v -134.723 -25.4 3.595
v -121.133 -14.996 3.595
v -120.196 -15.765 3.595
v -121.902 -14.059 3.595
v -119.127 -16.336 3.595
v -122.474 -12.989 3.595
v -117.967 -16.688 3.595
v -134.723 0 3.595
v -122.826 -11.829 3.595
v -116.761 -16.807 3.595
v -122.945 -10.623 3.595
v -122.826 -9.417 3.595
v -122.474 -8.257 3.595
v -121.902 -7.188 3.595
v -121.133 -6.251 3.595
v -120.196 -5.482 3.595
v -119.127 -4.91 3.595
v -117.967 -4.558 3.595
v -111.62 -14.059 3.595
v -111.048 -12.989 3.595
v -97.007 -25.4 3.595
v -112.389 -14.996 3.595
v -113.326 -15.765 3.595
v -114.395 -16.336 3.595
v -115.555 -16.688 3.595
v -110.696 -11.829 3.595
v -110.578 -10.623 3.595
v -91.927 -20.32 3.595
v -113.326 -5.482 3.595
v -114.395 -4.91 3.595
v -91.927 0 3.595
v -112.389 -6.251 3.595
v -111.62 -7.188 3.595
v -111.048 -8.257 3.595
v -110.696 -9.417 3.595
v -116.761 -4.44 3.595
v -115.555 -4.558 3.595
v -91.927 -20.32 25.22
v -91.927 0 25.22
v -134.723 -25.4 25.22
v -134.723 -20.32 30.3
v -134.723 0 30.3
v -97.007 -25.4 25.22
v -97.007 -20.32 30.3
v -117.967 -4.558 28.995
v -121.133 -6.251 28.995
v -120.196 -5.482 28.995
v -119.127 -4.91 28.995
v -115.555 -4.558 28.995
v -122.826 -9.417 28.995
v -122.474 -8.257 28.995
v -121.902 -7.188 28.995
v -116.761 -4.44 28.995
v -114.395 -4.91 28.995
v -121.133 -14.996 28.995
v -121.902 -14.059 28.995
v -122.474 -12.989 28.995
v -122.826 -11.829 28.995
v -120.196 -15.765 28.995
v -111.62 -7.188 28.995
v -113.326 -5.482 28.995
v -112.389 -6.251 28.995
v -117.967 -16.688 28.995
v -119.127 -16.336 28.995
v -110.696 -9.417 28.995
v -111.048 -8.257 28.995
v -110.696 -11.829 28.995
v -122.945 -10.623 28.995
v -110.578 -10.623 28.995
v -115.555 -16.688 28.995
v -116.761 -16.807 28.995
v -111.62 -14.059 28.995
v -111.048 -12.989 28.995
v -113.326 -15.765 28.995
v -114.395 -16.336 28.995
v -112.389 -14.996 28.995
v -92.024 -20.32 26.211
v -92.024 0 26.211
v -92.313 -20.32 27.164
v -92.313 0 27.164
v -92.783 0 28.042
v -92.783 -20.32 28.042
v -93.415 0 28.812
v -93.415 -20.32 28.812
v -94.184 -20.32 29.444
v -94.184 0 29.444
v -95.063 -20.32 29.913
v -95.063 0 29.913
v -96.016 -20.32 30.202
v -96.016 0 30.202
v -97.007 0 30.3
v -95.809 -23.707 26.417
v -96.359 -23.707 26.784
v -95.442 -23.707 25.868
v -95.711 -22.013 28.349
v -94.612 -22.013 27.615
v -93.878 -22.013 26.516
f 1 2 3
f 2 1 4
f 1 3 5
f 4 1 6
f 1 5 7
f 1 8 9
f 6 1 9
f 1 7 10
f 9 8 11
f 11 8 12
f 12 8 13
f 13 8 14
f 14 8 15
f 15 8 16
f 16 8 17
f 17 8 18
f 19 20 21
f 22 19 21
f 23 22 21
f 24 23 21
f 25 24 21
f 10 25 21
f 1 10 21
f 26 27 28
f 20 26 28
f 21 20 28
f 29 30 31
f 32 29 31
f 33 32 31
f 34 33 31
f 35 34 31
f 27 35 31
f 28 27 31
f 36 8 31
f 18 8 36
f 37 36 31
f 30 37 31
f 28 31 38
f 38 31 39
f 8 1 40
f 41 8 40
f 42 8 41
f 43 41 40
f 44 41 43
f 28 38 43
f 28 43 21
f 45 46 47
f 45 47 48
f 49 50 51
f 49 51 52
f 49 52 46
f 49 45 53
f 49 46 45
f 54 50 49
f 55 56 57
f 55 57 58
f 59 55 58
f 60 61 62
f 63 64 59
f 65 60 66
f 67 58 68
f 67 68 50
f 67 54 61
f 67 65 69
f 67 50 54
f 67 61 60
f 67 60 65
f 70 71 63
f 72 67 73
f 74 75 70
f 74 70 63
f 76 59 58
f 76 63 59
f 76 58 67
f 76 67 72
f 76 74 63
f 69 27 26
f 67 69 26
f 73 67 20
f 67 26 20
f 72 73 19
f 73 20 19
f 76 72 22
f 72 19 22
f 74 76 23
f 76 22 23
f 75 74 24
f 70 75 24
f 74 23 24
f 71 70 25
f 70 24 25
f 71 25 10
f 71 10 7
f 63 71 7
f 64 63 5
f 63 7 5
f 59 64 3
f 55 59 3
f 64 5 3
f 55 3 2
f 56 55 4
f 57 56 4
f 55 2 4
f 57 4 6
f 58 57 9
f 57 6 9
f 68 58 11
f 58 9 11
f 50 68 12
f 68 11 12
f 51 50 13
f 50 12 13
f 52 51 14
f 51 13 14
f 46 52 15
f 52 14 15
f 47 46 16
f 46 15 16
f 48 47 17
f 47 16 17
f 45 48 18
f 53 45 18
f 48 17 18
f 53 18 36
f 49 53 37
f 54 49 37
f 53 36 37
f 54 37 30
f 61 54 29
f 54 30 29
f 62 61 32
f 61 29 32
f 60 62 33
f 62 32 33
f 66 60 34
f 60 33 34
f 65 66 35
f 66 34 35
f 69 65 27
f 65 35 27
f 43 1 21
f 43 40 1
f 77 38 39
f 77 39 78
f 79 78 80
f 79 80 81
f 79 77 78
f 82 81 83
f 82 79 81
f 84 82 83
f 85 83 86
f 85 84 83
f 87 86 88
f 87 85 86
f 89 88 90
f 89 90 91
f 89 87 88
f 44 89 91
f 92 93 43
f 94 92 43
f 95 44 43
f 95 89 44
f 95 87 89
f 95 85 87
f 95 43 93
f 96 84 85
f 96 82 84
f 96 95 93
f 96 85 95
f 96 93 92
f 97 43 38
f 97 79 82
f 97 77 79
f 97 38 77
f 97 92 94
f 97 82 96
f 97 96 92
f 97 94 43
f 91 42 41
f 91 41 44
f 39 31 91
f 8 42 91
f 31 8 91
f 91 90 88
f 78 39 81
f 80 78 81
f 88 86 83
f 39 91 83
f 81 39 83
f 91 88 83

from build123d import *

# Parameters (mm, degrees)
F0_W     = 42.796455
F0_H     = 26.70499
F1_DEPTH = 25.4
F2_R     = 5.08
F3_SIZE  = 5.08
F4_R     = 6.183466
F5_DEPTH = 25.4


with BuildPart() as f1:
    # F0 (on Front) → F1 (new body)
    with BuildSketch(Plane.XZ):
        with Locations((-113.325018, 16.9474)):
            Rectangle(F0_W, F0_H)
    extrude(amount=F1_DEPTH)

    # F2
    f2_edges = [f1.edges().sort_by_distance(p)[0] for p in [
        (-91.926791, -12.7, 30.299895),
    ]]
    fillet(f2_edges, radius=F2_R)

    # F3
    f3_edges = [f1.edges().sort_by_distance(p)[0] for p in [
        (-115.865018, -25.4, 30.299895),
    ]]
    chamfer(f3_edges, length=F3_SIZE)

    # F4 (on face) → F5 (cut)
    with BuildSketch(Plane(origin=(0, 0, 3.594905), x_dir=(1, 0, 0), z_dir=(0, 0, -1))):
        with Locations((-116.761126, 10.623152)):
            Circle(F4_R)
    extrude(amount=-F5_DEPTH, mode=Mode.SUBTRACT)


solid = f1.part
